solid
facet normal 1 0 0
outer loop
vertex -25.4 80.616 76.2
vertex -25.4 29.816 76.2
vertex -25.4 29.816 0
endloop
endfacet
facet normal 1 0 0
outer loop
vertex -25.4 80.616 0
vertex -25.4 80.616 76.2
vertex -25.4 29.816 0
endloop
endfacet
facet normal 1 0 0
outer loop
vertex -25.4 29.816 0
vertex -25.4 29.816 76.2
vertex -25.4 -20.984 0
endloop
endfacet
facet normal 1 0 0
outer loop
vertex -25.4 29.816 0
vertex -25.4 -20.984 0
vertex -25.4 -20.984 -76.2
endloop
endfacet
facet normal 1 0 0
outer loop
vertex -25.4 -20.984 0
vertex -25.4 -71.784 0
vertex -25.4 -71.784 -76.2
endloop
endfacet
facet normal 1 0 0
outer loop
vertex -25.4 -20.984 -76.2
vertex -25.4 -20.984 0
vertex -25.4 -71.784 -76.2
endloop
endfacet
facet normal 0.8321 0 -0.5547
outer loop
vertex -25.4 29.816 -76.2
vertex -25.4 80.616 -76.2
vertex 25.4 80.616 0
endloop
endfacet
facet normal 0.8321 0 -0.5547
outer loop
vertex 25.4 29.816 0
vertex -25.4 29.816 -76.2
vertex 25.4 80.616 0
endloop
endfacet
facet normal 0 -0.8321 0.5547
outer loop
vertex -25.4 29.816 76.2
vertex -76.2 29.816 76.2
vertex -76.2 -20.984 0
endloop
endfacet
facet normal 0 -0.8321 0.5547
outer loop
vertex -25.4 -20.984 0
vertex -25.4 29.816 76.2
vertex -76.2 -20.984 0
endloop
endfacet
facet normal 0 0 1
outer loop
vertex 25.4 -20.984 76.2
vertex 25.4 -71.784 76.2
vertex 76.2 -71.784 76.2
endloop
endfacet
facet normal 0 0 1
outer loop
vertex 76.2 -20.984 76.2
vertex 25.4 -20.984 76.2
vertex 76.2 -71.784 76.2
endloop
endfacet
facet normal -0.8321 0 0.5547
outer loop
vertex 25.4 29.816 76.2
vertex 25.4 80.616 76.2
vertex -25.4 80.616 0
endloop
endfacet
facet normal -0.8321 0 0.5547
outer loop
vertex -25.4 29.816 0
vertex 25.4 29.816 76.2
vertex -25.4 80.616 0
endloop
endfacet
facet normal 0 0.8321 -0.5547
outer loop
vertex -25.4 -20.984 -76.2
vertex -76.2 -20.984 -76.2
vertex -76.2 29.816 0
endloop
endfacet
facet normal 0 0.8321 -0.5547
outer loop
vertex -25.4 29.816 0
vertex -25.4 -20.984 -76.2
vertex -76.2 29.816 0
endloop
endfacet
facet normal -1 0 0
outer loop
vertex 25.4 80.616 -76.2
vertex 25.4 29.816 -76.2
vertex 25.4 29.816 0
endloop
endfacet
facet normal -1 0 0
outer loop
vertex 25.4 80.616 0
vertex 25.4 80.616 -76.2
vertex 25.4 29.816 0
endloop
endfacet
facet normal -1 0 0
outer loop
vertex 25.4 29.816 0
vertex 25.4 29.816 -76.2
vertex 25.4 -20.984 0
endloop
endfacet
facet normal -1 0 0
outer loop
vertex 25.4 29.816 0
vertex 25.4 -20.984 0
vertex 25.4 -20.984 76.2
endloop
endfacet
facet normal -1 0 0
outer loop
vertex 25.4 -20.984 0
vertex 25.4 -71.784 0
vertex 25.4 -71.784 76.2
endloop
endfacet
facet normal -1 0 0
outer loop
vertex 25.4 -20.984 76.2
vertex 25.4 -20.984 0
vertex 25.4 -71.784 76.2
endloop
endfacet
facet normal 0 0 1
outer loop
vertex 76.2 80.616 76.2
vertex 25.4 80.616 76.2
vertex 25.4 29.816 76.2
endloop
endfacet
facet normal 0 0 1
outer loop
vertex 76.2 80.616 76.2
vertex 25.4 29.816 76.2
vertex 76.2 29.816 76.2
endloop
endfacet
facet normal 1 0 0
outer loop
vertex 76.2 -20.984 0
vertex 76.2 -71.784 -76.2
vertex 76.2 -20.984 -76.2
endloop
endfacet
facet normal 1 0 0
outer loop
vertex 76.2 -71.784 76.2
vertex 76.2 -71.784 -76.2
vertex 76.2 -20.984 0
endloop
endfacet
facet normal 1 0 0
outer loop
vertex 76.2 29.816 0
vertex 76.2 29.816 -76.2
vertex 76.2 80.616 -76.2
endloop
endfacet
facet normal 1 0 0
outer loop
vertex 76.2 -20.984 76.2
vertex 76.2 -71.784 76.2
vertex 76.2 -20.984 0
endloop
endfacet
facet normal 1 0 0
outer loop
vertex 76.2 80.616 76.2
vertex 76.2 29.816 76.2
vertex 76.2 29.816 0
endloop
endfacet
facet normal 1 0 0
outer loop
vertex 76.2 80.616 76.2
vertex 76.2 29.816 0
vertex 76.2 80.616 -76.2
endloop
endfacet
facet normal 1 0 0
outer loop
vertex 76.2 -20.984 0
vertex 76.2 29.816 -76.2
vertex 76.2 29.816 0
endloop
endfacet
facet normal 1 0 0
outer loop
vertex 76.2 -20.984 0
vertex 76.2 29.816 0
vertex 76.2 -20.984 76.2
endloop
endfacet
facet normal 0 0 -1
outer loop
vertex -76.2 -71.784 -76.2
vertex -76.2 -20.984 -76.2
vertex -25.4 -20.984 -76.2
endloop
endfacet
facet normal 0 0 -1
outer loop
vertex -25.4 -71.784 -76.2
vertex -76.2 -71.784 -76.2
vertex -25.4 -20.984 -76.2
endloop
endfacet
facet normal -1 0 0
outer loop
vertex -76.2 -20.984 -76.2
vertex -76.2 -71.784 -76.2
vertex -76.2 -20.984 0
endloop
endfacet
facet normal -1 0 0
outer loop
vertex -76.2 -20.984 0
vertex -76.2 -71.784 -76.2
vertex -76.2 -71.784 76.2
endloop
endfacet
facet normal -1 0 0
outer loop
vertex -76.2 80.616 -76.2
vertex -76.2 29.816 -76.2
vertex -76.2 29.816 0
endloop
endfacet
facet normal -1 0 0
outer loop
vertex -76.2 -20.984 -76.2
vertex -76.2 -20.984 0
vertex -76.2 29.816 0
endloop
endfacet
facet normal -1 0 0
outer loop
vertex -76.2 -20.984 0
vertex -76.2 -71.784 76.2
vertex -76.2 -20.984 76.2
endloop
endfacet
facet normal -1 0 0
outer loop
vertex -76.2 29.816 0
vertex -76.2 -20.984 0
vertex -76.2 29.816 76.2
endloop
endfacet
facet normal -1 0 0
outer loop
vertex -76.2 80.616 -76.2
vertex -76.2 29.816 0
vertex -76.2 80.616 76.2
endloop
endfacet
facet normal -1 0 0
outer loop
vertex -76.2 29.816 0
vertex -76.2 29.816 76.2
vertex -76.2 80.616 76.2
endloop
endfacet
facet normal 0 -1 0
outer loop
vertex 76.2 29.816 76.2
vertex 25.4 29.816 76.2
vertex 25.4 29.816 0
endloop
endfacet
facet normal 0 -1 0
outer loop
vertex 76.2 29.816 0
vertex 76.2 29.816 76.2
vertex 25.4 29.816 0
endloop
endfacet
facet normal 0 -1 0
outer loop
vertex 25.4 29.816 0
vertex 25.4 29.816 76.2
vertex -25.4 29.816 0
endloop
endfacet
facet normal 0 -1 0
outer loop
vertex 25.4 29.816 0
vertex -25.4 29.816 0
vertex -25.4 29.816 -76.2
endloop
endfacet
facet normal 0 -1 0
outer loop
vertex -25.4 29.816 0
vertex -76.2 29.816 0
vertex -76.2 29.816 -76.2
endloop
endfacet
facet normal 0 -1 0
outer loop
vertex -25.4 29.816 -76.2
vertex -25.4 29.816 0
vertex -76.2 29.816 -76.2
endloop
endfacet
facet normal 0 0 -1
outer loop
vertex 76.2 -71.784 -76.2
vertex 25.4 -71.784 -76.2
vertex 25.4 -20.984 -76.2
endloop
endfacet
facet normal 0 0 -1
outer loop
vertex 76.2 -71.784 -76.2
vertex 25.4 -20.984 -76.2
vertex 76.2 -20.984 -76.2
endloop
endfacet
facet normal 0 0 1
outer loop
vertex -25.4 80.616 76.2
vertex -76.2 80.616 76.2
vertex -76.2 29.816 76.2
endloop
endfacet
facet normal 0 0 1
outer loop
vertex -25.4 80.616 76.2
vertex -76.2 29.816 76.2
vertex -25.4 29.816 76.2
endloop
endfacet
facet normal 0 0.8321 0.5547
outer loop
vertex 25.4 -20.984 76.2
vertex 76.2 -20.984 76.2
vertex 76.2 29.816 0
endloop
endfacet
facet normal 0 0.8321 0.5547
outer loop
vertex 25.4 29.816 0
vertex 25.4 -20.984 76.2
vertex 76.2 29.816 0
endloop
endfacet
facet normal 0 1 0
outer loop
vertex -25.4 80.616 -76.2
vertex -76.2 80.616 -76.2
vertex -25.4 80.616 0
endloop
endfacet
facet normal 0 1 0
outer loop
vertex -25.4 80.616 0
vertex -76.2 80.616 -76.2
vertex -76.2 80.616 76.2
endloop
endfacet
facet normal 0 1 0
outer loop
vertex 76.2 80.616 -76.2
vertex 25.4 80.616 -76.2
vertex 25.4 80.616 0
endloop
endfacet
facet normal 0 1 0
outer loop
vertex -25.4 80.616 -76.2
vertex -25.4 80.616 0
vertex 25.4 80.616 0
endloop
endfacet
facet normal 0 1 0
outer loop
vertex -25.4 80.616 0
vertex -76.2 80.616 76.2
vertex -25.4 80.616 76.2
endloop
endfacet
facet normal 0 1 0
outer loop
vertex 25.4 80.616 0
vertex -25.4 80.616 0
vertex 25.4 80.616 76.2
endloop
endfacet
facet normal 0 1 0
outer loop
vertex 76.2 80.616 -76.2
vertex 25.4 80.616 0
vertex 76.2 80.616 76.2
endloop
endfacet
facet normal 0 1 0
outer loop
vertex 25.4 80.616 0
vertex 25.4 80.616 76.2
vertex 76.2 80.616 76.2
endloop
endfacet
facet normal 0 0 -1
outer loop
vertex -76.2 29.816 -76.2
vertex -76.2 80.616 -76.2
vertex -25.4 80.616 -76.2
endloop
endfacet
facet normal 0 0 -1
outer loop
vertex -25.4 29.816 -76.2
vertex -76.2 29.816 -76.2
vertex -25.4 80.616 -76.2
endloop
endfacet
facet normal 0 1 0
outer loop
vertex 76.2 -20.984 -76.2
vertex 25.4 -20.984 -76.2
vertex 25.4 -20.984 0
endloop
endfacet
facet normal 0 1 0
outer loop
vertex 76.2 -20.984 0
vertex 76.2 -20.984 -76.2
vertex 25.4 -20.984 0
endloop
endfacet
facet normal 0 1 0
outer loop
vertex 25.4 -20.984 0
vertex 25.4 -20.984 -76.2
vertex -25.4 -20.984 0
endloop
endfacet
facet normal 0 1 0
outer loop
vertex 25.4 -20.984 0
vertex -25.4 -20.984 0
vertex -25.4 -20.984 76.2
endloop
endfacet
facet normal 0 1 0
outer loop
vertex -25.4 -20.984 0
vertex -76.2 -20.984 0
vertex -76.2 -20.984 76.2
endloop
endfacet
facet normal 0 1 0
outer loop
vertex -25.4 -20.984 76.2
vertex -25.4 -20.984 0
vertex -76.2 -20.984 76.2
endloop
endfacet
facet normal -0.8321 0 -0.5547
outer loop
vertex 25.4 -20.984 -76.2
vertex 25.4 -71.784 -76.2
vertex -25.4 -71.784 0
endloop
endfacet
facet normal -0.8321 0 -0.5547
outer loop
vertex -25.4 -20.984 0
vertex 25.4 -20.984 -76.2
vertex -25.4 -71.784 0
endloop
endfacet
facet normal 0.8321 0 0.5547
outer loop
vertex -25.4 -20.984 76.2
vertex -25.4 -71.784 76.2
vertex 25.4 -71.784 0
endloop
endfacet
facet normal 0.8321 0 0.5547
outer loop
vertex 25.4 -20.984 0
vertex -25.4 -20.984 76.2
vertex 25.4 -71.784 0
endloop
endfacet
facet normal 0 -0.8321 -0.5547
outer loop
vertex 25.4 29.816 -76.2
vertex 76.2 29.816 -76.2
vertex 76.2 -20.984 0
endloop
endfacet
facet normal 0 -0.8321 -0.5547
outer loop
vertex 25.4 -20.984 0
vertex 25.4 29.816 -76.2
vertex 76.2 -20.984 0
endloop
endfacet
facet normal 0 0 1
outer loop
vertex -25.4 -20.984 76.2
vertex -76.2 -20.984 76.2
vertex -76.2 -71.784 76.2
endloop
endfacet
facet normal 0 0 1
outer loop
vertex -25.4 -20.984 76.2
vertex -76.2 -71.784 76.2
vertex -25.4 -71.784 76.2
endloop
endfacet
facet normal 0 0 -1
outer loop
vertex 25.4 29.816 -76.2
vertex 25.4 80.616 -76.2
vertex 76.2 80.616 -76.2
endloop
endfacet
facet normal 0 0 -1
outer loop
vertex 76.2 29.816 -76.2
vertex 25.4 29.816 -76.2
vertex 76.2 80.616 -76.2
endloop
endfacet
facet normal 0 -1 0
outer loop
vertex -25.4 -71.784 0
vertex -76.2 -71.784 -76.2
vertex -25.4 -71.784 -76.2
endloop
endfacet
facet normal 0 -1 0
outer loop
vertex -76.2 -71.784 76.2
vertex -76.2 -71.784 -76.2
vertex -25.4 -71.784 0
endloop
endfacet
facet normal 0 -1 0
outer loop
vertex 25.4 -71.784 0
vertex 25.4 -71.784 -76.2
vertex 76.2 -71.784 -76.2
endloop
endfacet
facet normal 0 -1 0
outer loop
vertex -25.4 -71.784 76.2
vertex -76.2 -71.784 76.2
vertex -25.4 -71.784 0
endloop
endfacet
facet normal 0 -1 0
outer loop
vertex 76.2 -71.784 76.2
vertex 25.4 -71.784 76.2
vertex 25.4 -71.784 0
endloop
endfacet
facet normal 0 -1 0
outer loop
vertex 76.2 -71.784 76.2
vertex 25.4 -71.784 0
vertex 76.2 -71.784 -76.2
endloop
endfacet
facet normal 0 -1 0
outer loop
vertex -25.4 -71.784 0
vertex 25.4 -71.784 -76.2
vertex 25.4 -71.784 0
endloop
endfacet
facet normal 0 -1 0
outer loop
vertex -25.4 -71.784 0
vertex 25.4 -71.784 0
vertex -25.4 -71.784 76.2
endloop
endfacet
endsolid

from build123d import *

# Parameters (mm, degrees)
F0_W      = 152.4
F0_H      = 152.4
F1_DEPTH  = 76.2
F2_W      = 25.4
F2_H      = 25.4
F3_DEPTH  = 152.401
F5_DEPTH  = 50.8
F7_DEPTH  = 50.8
F9_DEPTH  = 50.8
F11_DEPTH = 50.8


with BuildPart() as f1:
    # F0 (on Top) → F1 (new body, symmetric)
    with BuildSketch(Plane.XY):
        with Locations((0, 4.4160668929)):
            Rectangle(F0_W, F0_H)
    extrude(amount=F1_DEPTH, both=True)

    # F2 (on face) → F3 (cut, through all)
    with BuildSketch(Plane.XY.offset(76.2)):
        Polygon((0, 29.8160668929), (-25.4, 29.8160668929), (0, 4.4160668929), align=None)
        with Locations((12.7, 17.1160668929)):
            Rectangle(F2_W, F2_H)
        Polygon((25.4, 4.4160668929), (0, 4.4160668929), (25.4, -20.9839331071), align=None)
        Polygon((25.4, -20.9839331071), (0, 4.4160668929), (0, -20.9839331071), align=None)
        with Locations((-12.7, -8.2839331071)):
            Rectangle(F2_W, F2_H)
        Polygon((0, 4.4160668929), (-25.4, 29.8160668929), (-25.4, 4.4160668929), align=None)
    extrude(amount=-F3_DEPTH, mode=Mode.SUBTRACT)

    # F4 (on face) → F5 (cut)
    with BuildSketch(Plane(origin=(0, 80.6160668929, 0), x_dir=(-1, 0, 0), z_dir=(0, 1, 0))):
        Polygon((25.4, -76.2), (-25.4, 0), (-25.4, -76.2), align=None)
        Polygon((25.4, 76.2), (-25.4, 76.2), (25.4, 0), align=None)
    extrude(amount=-F5_DEPTH, mode=Mode.SUBTRACT)

    # F6 (on face) → F7 (cut)
    with BuildSketch(Plane(origin=(-76.2, 0, 0), x_dir=(0, -1, 0), z_dir=(-1, 0, 0))):
        Polygon((20.9839331071, -76.2), (-29.8160668929, 0), (-29.8160668929, -76.2), align=None)
        Polygon((20.9839331071, 76.2), (-29.8160668929, 76.2), (20.9839331071, 0), align=None)
    extrude(amount=-F7_DEPTH, mode=Mode.SUBTRACT)

    # F8 (on face) → F9 (cut)
    with BuildSketch(Plane.XZ.offset(71.7839331071)):
        Polygon((25.4, -76.2), (-25.4, 0), (-25.4, -76.2), align=None)
        Polygon((25.4, 76.2), (-25.4, 76.2), (25.4, 0), align=None)
    extrude(amount=-F9_DEPTH, mode=Mode.SUBTRACT)

    # F10 (on face) → F11 (cut)
    with BuildSketch(Plane.YZ.offset(76.2)):
        Polygon((29.8160668929, -76.2), (-20.9839331071, 0), (-20.9839331071, -76.2), align=None)
        Polygon((29.8160668929, 76.2), (-20.9839331071, 76.2), (29.8160668929, 0), align=None)
    extrude(amount=-F11_DEPTH, mode=Mode.SUBTRACT)


solid = f1.part
